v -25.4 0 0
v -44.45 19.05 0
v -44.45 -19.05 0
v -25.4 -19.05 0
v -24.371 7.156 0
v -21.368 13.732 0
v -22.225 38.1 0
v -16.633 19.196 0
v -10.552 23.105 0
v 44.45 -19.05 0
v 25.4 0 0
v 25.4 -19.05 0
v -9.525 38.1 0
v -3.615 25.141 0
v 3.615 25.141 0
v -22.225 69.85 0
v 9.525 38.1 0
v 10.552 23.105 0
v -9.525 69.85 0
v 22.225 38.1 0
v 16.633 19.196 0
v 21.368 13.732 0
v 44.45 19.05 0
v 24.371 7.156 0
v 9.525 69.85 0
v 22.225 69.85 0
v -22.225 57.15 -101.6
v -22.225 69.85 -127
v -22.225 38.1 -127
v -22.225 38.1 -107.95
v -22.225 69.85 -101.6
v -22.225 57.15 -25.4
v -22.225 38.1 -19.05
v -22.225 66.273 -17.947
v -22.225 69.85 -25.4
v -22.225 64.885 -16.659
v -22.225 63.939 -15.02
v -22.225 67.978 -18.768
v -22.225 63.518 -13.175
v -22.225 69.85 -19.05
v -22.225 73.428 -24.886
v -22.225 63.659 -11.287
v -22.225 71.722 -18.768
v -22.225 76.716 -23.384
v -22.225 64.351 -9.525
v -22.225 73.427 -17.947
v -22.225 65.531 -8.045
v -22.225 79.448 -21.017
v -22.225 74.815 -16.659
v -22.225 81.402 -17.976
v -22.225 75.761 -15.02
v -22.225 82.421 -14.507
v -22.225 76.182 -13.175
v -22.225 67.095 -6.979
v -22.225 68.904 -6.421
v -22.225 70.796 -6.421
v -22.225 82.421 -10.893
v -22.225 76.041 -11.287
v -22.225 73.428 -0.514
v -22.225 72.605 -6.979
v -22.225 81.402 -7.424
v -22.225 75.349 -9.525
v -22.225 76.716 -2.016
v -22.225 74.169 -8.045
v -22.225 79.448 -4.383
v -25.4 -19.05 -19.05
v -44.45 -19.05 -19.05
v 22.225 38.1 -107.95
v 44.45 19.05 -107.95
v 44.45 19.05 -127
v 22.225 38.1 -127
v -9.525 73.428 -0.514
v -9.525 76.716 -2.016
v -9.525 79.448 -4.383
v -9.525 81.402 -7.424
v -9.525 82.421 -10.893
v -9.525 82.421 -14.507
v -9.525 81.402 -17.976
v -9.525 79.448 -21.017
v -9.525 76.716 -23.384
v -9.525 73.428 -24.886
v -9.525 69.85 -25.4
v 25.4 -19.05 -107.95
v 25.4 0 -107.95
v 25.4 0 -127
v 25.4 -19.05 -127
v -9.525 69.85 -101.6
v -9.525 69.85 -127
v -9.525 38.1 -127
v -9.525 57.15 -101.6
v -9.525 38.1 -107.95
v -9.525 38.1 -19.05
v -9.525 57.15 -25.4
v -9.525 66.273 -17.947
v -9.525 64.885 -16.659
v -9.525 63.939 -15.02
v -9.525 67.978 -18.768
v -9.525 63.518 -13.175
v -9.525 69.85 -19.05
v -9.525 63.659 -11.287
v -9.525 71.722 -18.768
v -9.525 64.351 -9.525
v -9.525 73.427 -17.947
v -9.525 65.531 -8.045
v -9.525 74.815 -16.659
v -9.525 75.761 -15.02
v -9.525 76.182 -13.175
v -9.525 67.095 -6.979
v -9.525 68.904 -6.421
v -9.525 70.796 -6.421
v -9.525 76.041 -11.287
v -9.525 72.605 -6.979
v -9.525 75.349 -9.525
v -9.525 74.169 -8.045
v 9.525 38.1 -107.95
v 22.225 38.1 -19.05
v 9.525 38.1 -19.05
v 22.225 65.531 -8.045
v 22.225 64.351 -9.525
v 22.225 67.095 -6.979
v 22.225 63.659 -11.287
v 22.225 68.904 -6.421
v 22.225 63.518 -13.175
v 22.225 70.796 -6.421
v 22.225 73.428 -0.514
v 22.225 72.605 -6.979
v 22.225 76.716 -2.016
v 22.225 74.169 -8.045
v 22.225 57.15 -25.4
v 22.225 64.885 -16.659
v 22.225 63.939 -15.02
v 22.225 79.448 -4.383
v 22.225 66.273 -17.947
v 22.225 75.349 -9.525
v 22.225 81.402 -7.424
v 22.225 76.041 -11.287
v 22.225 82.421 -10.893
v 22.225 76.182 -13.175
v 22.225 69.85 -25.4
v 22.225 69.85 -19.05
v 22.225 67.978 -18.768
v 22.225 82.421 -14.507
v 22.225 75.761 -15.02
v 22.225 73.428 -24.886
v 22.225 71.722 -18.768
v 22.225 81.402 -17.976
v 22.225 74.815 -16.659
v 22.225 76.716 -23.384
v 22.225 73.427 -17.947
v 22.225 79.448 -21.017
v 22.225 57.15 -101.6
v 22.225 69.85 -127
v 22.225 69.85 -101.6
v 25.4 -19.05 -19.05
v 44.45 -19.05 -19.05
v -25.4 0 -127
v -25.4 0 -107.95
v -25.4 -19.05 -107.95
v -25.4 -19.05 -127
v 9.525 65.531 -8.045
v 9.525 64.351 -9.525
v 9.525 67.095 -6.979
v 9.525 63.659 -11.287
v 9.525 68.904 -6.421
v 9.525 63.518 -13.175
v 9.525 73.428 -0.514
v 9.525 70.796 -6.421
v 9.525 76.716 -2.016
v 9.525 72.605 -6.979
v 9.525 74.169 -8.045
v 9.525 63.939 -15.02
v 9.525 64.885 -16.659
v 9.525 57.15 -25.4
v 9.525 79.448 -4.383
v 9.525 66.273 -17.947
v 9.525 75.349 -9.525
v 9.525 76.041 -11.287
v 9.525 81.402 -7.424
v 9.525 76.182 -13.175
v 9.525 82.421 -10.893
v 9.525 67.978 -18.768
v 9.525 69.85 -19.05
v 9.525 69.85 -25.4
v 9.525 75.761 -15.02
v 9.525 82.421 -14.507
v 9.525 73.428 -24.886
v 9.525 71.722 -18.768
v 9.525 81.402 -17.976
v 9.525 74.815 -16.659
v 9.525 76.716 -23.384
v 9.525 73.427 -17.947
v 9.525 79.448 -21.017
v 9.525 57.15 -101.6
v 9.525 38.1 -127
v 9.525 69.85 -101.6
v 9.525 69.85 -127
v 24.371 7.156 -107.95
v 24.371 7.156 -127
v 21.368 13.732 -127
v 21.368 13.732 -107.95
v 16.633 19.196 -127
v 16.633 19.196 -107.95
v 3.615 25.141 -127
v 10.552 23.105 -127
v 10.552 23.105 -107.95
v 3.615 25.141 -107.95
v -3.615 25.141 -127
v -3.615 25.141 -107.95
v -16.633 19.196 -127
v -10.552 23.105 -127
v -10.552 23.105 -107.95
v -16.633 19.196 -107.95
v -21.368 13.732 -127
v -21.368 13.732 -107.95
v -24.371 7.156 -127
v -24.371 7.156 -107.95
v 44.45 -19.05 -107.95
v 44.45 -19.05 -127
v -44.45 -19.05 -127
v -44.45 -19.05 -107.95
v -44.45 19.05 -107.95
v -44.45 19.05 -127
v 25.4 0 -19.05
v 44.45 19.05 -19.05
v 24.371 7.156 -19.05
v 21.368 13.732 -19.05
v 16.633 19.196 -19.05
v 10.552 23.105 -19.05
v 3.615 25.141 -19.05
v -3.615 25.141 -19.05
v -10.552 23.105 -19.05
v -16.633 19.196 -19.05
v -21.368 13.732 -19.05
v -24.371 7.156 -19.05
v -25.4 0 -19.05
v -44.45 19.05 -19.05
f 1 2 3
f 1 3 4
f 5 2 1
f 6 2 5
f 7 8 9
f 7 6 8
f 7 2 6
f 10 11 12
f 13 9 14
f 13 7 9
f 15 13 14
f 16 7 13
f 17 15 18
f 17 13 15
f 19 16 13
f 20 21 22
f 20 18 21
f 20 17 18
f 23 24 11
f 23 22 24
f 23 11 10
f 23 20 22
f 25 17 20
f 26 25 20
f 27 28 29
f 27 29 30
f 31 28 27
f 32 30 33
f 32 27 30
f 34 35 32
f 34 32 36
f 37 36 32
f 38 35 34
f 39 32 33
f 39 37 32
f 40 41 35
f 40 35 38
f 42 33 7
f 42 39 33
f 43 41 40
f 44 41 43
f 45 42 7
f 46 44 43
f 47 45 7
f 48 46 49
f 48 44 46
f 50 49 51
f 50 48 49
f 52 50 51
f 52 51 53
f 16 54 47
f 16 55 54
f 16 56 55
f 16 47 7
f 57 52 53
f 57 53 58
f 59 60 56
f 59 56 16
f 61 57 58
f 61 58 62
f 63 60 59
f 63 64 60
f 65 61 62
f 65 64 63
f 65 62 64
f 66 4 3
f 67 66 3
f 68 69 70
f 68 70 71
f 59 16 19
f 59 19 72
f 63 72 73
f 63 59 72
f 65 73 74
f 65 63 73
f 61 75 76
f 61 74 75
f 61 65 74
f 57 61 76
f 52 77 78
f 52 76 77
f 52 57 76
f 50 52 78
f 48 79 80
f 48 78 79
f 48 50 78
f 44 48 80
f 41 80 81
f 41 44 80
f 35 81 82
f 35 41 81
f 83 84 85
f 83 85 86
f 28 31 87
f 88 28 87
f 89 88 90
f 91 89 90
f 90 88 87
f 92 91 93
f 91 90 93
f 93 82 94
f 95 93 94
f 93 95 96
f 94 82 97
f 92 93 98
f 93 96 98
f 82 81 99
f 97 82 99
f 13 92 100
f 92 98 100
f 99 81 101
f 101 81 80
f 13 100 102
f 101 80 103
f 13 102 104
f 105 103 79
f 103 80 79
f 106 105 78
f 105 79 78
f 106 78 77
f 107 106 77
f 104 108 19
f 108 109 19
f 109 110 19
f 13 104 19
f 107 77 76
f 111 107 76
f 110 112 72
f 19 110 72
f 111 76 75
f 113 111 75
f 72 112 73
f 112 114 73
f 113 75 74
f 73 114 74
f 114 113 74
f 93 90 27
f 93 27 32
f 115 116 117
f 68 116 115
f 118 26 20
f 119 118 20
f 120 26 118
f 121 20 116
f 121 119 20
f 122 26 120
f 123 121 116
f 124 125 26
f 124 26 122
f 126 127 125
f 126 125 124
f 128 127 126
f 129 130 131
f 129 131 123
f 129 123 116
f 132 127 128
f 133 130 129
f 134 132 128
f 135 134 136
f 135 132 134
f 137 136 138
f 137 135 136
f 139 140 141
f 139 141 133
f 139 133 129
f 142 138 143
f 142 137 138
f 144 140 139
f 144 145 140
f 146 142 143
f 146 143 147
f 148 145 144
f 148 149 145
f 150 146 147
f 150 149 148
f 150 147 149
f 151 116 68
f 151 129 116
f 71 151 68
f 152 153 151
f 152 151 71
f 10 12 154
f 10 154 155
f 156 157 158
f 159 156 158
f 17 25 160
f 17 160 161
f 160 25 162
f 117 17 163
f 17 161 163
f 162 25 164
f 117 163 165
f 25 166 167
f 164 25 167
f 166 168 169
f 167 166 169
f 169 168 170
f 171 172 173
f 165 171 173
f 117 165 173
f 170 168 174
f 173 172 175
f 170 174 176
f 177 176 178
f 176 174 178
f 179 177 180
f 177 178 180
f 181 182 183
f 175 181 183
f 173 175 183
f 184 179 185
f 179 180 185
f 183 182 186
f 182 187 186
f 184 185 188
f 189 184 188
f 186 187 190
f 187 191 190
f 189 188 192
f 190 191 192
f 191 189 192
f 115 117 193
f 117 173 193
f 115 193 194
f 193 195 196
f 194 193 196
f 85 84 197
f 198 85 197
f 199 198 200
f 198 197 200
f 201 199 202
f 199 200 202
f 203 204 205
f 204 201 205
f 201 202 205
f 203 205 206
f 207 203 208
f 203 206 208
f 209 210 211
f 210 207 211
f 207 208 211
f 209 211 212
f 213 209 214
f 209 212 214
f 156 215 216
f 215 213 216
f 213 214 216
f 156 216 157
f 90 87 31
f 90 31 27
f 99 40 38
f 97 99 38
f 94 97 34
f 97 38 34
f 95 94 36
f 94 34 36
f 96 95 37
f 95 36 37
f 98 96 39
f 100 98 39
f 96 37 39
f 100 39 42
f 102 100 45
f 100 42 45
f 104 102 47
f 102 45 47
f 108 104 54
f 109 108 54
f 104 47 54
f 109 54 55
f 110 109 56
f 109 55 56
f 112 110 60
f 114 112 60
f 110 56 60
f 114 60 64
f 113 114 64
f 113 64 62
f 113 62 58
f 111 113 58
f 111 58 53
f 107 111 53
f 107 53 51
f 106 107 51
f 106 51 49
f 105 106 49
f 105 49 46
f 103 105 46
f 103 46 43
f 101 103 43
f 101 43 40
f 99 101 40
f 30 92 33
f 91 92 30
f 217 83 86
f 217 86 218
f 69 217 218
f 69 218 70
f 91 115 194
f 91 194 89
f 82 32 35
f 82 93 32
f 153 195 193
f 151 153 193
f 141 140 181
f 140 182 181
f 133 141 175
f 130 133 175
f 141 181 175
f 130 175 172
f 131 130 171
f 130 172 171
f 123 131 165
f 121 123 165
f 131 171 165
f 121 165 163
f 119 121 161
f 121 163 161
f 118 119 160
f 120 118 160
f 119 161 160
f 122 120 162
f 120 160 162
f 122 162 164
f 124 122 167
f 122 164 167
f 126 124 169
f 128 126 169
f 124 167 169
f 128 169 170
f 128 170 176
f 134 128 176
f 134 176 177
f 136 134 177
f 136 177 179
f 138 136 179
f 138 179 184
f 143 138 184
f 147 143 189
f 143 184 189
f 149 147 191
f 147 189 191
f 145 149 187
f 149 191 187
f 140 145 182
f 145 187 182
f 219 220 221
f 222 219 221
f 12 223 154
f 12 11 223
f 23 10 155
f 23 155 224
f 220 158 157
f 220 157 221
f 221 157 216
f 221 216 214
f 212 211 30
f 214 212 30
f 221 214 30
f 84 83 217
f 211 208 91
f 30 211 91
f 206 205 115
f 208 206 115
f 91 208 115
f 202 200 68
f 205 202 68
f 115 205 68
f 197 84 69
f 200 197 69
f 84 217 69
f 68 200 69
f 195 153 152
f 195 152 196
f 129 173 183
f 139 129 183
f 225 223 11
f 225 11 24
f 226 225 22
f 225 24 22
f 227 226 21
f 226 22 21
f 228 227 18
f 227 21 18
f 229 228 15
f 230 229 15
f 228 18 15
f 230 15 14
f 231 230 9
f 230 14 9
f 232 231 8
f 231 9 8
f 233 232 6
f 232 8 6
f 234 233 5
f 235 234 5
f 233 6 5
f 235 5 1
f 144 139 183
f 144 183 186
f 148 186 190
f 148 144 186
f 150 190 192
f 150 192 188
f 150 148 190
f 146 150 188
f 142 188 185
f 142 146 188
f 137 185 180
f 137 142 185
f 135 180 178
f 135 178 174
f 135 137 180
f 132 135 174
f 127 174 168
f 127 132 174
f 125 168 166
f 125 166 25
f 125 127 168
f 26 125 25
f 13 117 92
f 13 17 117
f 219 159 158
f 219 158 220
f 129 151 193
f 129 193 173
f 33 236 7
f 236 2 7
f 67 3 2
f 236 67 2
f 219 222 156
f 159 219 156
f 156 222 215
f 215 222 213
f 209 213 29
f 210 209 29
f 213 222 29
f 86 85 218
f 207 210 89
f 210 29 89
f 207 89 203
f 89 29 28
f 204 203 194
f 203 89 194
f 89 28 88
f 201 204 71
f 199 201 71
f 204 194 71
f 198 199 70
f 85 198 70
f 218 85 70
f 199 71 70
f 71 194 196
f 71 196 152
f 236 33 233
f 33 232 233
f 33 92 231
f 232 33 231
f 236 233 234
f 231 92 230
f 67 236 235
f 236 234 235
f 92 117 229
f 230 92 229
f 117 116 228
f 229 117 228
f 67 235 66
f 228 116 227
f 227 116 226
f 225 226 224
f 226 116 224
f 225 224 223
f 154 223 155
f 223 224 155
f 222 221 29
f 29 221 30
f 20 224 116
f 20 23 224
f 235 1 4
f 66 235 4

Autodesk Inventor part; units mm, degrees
ref_plane "YZ Plane" through (0, 0, 0) normal (1, 0, 0) x (0, 1, 0)
ref_plane "XZ Plane" through (0, 0, 0) normal (0, 1, 0) x (-1, 0, 0)
ref_plane "XY Plane" through (0, 0, 0) normal (0, 0, 1) x (1, 0, 0)
sketch "Sketch1" plane through (0, 0, 0) normal (0, 0, 1) x (1, 0, 0)
  arc A0 (25.4, 0) -> (-25.4, 0) centre (0, 0) ccw
  line L0 (-25.4, 0) -> (-25.4, -19.05)
  line L1 (-25.4, -19.05) -> (-44.45, -19.05)
  line L2 (-44.45, -19.05) -> (-44.45, 19.05)
  line L3 (-44.45, 19.05) -> (-22.225, 38.1)
  line L4 (-22.225, 38.1) -> (-22.225, 69.85)
  line L5 (-22.225, 69.85) -> (-9.525, 69.85)
  line L6 (-9.525, 69.85) -> (-9.525, 38.1)
  line L7 (-9.525, 38.1) -> (0, 38.1)
  line L8 (0, 38.1) -> (0, -30.0357)
  line L9 (25.4, 0) -> (25.4, -19.05)
  line L10 (25.4, -19.05) -> (44.45, -19.05)
  line L11 (44.45, -19.05) -> (44.45, 19.05)
  line L12 (44.45, 19.05) -> (22.225, 38.1)
  line L13 (22.225, 38.1) -> (22.225, 69.85)
  line L14 (9.525, 69.85) -> (9.525, 38.1)
  line L15 (22.225, 69.85) -> (9.525, 69.85)
  line L16 (9.525, 38.1) -> (0, 38.1)
  dimension "d0" = 88.9
  dimension "d1" = 19.05
  dimension "d2" = 38.1
  dimension "d3" = 31.75
  dimension "d4" = 19.05
  dimension "d5" = 25.4
  dimension "d6" = 88.9
  dimension "d7" = 19.05
  dimension "d8" = 44.45
extrude "Extrusion1" add sketch "Sketch1" against normal blind 127
sketch "Sketch3" plane through (44.45, -19.05, 0) normal (1, 0, 0) x (0, 0, -1)
  line L0 (0, 88.9) -> (127, 88.9) projected
  line L1 (25.4, 88.9) -> (101.6, 88.9)
  line L2 (101.6, 88.9) -> (101.6, 76.2)
  line L3 (101.6, 76.2) -> (25.4, 76.2)
  line L4 (25.4, 76.2) -> (25.4, 88.9)
  line L5 (127, 88.9) -> (127, 57.15) projected
  line L6 (0, 57.15) -> (0, 88.9) projected
  line L7 (0, 0) -> (127, 0) projected
  line L8 (0, 57.15) -> (127, 57.15) projected
  line L9 (19.05, 0) -> (107.95, 0)
  line L10 (107.95, 0) -> (107.95, 57.15)
  line L11 (107.95, 57.15) -> (19.05, 57.15)
  line L12 (19.05, 57.15) -> (19.05, 0)
  line L13 (127, 38.1) -> (127, 0) projected
  line L14 (0, 0) -> (0, 38.1) projected
  point P0 (0, 19.05)
  point P1 (101.6, 82.55)
  point P2 (107.95, 0)
  dimension "d12" = 25.4
  dimension "d13" = 25.4
  dimension "d14" = 12.7
  dimension "d15" = 19.05
  dimension "d16" = 19.05
extrude "Extrusion2" cut sketch "Sketch3" against normal through all contours L0 L2 L3 L4 | L8 L10 L7 L12
sketch "Sketch4" plane through (22.225, 38.1, 0) normal (1, 0, 0) x (0, 0, -1)
  line L0 (0, 31.75) -> (25.4, 31.75) projected
  arc A0 (25.4, 31.75) -> (0, 31.75) centre (12.7, 31.75) ccw
  point P0 (0, -38.1)
extrude "Extrusion3" add sketch "Sketch4" against normal up to surface (12.7 mm away)
mirror "Mirror1" about plane through (0, 0, 0) normal (1, 0, 0) of "Extrusion3"
sketch "Sketch5" plane through (22.225, 38.1, -127) normal (1, 0, 0) x (0, 0, -1)
  arc A0 (-101.6, 31.75) -> (-127, 31.75) centre (-114.3, 31.75) ccw projected
  point P0 (-127, -38.1)
hole "Hole1" at (22.225, 69.85, -12.7) direction (-1, 0, 0) diameter 12.7 end through all
properties part number "TransferFork" material "Iron, Cast"
